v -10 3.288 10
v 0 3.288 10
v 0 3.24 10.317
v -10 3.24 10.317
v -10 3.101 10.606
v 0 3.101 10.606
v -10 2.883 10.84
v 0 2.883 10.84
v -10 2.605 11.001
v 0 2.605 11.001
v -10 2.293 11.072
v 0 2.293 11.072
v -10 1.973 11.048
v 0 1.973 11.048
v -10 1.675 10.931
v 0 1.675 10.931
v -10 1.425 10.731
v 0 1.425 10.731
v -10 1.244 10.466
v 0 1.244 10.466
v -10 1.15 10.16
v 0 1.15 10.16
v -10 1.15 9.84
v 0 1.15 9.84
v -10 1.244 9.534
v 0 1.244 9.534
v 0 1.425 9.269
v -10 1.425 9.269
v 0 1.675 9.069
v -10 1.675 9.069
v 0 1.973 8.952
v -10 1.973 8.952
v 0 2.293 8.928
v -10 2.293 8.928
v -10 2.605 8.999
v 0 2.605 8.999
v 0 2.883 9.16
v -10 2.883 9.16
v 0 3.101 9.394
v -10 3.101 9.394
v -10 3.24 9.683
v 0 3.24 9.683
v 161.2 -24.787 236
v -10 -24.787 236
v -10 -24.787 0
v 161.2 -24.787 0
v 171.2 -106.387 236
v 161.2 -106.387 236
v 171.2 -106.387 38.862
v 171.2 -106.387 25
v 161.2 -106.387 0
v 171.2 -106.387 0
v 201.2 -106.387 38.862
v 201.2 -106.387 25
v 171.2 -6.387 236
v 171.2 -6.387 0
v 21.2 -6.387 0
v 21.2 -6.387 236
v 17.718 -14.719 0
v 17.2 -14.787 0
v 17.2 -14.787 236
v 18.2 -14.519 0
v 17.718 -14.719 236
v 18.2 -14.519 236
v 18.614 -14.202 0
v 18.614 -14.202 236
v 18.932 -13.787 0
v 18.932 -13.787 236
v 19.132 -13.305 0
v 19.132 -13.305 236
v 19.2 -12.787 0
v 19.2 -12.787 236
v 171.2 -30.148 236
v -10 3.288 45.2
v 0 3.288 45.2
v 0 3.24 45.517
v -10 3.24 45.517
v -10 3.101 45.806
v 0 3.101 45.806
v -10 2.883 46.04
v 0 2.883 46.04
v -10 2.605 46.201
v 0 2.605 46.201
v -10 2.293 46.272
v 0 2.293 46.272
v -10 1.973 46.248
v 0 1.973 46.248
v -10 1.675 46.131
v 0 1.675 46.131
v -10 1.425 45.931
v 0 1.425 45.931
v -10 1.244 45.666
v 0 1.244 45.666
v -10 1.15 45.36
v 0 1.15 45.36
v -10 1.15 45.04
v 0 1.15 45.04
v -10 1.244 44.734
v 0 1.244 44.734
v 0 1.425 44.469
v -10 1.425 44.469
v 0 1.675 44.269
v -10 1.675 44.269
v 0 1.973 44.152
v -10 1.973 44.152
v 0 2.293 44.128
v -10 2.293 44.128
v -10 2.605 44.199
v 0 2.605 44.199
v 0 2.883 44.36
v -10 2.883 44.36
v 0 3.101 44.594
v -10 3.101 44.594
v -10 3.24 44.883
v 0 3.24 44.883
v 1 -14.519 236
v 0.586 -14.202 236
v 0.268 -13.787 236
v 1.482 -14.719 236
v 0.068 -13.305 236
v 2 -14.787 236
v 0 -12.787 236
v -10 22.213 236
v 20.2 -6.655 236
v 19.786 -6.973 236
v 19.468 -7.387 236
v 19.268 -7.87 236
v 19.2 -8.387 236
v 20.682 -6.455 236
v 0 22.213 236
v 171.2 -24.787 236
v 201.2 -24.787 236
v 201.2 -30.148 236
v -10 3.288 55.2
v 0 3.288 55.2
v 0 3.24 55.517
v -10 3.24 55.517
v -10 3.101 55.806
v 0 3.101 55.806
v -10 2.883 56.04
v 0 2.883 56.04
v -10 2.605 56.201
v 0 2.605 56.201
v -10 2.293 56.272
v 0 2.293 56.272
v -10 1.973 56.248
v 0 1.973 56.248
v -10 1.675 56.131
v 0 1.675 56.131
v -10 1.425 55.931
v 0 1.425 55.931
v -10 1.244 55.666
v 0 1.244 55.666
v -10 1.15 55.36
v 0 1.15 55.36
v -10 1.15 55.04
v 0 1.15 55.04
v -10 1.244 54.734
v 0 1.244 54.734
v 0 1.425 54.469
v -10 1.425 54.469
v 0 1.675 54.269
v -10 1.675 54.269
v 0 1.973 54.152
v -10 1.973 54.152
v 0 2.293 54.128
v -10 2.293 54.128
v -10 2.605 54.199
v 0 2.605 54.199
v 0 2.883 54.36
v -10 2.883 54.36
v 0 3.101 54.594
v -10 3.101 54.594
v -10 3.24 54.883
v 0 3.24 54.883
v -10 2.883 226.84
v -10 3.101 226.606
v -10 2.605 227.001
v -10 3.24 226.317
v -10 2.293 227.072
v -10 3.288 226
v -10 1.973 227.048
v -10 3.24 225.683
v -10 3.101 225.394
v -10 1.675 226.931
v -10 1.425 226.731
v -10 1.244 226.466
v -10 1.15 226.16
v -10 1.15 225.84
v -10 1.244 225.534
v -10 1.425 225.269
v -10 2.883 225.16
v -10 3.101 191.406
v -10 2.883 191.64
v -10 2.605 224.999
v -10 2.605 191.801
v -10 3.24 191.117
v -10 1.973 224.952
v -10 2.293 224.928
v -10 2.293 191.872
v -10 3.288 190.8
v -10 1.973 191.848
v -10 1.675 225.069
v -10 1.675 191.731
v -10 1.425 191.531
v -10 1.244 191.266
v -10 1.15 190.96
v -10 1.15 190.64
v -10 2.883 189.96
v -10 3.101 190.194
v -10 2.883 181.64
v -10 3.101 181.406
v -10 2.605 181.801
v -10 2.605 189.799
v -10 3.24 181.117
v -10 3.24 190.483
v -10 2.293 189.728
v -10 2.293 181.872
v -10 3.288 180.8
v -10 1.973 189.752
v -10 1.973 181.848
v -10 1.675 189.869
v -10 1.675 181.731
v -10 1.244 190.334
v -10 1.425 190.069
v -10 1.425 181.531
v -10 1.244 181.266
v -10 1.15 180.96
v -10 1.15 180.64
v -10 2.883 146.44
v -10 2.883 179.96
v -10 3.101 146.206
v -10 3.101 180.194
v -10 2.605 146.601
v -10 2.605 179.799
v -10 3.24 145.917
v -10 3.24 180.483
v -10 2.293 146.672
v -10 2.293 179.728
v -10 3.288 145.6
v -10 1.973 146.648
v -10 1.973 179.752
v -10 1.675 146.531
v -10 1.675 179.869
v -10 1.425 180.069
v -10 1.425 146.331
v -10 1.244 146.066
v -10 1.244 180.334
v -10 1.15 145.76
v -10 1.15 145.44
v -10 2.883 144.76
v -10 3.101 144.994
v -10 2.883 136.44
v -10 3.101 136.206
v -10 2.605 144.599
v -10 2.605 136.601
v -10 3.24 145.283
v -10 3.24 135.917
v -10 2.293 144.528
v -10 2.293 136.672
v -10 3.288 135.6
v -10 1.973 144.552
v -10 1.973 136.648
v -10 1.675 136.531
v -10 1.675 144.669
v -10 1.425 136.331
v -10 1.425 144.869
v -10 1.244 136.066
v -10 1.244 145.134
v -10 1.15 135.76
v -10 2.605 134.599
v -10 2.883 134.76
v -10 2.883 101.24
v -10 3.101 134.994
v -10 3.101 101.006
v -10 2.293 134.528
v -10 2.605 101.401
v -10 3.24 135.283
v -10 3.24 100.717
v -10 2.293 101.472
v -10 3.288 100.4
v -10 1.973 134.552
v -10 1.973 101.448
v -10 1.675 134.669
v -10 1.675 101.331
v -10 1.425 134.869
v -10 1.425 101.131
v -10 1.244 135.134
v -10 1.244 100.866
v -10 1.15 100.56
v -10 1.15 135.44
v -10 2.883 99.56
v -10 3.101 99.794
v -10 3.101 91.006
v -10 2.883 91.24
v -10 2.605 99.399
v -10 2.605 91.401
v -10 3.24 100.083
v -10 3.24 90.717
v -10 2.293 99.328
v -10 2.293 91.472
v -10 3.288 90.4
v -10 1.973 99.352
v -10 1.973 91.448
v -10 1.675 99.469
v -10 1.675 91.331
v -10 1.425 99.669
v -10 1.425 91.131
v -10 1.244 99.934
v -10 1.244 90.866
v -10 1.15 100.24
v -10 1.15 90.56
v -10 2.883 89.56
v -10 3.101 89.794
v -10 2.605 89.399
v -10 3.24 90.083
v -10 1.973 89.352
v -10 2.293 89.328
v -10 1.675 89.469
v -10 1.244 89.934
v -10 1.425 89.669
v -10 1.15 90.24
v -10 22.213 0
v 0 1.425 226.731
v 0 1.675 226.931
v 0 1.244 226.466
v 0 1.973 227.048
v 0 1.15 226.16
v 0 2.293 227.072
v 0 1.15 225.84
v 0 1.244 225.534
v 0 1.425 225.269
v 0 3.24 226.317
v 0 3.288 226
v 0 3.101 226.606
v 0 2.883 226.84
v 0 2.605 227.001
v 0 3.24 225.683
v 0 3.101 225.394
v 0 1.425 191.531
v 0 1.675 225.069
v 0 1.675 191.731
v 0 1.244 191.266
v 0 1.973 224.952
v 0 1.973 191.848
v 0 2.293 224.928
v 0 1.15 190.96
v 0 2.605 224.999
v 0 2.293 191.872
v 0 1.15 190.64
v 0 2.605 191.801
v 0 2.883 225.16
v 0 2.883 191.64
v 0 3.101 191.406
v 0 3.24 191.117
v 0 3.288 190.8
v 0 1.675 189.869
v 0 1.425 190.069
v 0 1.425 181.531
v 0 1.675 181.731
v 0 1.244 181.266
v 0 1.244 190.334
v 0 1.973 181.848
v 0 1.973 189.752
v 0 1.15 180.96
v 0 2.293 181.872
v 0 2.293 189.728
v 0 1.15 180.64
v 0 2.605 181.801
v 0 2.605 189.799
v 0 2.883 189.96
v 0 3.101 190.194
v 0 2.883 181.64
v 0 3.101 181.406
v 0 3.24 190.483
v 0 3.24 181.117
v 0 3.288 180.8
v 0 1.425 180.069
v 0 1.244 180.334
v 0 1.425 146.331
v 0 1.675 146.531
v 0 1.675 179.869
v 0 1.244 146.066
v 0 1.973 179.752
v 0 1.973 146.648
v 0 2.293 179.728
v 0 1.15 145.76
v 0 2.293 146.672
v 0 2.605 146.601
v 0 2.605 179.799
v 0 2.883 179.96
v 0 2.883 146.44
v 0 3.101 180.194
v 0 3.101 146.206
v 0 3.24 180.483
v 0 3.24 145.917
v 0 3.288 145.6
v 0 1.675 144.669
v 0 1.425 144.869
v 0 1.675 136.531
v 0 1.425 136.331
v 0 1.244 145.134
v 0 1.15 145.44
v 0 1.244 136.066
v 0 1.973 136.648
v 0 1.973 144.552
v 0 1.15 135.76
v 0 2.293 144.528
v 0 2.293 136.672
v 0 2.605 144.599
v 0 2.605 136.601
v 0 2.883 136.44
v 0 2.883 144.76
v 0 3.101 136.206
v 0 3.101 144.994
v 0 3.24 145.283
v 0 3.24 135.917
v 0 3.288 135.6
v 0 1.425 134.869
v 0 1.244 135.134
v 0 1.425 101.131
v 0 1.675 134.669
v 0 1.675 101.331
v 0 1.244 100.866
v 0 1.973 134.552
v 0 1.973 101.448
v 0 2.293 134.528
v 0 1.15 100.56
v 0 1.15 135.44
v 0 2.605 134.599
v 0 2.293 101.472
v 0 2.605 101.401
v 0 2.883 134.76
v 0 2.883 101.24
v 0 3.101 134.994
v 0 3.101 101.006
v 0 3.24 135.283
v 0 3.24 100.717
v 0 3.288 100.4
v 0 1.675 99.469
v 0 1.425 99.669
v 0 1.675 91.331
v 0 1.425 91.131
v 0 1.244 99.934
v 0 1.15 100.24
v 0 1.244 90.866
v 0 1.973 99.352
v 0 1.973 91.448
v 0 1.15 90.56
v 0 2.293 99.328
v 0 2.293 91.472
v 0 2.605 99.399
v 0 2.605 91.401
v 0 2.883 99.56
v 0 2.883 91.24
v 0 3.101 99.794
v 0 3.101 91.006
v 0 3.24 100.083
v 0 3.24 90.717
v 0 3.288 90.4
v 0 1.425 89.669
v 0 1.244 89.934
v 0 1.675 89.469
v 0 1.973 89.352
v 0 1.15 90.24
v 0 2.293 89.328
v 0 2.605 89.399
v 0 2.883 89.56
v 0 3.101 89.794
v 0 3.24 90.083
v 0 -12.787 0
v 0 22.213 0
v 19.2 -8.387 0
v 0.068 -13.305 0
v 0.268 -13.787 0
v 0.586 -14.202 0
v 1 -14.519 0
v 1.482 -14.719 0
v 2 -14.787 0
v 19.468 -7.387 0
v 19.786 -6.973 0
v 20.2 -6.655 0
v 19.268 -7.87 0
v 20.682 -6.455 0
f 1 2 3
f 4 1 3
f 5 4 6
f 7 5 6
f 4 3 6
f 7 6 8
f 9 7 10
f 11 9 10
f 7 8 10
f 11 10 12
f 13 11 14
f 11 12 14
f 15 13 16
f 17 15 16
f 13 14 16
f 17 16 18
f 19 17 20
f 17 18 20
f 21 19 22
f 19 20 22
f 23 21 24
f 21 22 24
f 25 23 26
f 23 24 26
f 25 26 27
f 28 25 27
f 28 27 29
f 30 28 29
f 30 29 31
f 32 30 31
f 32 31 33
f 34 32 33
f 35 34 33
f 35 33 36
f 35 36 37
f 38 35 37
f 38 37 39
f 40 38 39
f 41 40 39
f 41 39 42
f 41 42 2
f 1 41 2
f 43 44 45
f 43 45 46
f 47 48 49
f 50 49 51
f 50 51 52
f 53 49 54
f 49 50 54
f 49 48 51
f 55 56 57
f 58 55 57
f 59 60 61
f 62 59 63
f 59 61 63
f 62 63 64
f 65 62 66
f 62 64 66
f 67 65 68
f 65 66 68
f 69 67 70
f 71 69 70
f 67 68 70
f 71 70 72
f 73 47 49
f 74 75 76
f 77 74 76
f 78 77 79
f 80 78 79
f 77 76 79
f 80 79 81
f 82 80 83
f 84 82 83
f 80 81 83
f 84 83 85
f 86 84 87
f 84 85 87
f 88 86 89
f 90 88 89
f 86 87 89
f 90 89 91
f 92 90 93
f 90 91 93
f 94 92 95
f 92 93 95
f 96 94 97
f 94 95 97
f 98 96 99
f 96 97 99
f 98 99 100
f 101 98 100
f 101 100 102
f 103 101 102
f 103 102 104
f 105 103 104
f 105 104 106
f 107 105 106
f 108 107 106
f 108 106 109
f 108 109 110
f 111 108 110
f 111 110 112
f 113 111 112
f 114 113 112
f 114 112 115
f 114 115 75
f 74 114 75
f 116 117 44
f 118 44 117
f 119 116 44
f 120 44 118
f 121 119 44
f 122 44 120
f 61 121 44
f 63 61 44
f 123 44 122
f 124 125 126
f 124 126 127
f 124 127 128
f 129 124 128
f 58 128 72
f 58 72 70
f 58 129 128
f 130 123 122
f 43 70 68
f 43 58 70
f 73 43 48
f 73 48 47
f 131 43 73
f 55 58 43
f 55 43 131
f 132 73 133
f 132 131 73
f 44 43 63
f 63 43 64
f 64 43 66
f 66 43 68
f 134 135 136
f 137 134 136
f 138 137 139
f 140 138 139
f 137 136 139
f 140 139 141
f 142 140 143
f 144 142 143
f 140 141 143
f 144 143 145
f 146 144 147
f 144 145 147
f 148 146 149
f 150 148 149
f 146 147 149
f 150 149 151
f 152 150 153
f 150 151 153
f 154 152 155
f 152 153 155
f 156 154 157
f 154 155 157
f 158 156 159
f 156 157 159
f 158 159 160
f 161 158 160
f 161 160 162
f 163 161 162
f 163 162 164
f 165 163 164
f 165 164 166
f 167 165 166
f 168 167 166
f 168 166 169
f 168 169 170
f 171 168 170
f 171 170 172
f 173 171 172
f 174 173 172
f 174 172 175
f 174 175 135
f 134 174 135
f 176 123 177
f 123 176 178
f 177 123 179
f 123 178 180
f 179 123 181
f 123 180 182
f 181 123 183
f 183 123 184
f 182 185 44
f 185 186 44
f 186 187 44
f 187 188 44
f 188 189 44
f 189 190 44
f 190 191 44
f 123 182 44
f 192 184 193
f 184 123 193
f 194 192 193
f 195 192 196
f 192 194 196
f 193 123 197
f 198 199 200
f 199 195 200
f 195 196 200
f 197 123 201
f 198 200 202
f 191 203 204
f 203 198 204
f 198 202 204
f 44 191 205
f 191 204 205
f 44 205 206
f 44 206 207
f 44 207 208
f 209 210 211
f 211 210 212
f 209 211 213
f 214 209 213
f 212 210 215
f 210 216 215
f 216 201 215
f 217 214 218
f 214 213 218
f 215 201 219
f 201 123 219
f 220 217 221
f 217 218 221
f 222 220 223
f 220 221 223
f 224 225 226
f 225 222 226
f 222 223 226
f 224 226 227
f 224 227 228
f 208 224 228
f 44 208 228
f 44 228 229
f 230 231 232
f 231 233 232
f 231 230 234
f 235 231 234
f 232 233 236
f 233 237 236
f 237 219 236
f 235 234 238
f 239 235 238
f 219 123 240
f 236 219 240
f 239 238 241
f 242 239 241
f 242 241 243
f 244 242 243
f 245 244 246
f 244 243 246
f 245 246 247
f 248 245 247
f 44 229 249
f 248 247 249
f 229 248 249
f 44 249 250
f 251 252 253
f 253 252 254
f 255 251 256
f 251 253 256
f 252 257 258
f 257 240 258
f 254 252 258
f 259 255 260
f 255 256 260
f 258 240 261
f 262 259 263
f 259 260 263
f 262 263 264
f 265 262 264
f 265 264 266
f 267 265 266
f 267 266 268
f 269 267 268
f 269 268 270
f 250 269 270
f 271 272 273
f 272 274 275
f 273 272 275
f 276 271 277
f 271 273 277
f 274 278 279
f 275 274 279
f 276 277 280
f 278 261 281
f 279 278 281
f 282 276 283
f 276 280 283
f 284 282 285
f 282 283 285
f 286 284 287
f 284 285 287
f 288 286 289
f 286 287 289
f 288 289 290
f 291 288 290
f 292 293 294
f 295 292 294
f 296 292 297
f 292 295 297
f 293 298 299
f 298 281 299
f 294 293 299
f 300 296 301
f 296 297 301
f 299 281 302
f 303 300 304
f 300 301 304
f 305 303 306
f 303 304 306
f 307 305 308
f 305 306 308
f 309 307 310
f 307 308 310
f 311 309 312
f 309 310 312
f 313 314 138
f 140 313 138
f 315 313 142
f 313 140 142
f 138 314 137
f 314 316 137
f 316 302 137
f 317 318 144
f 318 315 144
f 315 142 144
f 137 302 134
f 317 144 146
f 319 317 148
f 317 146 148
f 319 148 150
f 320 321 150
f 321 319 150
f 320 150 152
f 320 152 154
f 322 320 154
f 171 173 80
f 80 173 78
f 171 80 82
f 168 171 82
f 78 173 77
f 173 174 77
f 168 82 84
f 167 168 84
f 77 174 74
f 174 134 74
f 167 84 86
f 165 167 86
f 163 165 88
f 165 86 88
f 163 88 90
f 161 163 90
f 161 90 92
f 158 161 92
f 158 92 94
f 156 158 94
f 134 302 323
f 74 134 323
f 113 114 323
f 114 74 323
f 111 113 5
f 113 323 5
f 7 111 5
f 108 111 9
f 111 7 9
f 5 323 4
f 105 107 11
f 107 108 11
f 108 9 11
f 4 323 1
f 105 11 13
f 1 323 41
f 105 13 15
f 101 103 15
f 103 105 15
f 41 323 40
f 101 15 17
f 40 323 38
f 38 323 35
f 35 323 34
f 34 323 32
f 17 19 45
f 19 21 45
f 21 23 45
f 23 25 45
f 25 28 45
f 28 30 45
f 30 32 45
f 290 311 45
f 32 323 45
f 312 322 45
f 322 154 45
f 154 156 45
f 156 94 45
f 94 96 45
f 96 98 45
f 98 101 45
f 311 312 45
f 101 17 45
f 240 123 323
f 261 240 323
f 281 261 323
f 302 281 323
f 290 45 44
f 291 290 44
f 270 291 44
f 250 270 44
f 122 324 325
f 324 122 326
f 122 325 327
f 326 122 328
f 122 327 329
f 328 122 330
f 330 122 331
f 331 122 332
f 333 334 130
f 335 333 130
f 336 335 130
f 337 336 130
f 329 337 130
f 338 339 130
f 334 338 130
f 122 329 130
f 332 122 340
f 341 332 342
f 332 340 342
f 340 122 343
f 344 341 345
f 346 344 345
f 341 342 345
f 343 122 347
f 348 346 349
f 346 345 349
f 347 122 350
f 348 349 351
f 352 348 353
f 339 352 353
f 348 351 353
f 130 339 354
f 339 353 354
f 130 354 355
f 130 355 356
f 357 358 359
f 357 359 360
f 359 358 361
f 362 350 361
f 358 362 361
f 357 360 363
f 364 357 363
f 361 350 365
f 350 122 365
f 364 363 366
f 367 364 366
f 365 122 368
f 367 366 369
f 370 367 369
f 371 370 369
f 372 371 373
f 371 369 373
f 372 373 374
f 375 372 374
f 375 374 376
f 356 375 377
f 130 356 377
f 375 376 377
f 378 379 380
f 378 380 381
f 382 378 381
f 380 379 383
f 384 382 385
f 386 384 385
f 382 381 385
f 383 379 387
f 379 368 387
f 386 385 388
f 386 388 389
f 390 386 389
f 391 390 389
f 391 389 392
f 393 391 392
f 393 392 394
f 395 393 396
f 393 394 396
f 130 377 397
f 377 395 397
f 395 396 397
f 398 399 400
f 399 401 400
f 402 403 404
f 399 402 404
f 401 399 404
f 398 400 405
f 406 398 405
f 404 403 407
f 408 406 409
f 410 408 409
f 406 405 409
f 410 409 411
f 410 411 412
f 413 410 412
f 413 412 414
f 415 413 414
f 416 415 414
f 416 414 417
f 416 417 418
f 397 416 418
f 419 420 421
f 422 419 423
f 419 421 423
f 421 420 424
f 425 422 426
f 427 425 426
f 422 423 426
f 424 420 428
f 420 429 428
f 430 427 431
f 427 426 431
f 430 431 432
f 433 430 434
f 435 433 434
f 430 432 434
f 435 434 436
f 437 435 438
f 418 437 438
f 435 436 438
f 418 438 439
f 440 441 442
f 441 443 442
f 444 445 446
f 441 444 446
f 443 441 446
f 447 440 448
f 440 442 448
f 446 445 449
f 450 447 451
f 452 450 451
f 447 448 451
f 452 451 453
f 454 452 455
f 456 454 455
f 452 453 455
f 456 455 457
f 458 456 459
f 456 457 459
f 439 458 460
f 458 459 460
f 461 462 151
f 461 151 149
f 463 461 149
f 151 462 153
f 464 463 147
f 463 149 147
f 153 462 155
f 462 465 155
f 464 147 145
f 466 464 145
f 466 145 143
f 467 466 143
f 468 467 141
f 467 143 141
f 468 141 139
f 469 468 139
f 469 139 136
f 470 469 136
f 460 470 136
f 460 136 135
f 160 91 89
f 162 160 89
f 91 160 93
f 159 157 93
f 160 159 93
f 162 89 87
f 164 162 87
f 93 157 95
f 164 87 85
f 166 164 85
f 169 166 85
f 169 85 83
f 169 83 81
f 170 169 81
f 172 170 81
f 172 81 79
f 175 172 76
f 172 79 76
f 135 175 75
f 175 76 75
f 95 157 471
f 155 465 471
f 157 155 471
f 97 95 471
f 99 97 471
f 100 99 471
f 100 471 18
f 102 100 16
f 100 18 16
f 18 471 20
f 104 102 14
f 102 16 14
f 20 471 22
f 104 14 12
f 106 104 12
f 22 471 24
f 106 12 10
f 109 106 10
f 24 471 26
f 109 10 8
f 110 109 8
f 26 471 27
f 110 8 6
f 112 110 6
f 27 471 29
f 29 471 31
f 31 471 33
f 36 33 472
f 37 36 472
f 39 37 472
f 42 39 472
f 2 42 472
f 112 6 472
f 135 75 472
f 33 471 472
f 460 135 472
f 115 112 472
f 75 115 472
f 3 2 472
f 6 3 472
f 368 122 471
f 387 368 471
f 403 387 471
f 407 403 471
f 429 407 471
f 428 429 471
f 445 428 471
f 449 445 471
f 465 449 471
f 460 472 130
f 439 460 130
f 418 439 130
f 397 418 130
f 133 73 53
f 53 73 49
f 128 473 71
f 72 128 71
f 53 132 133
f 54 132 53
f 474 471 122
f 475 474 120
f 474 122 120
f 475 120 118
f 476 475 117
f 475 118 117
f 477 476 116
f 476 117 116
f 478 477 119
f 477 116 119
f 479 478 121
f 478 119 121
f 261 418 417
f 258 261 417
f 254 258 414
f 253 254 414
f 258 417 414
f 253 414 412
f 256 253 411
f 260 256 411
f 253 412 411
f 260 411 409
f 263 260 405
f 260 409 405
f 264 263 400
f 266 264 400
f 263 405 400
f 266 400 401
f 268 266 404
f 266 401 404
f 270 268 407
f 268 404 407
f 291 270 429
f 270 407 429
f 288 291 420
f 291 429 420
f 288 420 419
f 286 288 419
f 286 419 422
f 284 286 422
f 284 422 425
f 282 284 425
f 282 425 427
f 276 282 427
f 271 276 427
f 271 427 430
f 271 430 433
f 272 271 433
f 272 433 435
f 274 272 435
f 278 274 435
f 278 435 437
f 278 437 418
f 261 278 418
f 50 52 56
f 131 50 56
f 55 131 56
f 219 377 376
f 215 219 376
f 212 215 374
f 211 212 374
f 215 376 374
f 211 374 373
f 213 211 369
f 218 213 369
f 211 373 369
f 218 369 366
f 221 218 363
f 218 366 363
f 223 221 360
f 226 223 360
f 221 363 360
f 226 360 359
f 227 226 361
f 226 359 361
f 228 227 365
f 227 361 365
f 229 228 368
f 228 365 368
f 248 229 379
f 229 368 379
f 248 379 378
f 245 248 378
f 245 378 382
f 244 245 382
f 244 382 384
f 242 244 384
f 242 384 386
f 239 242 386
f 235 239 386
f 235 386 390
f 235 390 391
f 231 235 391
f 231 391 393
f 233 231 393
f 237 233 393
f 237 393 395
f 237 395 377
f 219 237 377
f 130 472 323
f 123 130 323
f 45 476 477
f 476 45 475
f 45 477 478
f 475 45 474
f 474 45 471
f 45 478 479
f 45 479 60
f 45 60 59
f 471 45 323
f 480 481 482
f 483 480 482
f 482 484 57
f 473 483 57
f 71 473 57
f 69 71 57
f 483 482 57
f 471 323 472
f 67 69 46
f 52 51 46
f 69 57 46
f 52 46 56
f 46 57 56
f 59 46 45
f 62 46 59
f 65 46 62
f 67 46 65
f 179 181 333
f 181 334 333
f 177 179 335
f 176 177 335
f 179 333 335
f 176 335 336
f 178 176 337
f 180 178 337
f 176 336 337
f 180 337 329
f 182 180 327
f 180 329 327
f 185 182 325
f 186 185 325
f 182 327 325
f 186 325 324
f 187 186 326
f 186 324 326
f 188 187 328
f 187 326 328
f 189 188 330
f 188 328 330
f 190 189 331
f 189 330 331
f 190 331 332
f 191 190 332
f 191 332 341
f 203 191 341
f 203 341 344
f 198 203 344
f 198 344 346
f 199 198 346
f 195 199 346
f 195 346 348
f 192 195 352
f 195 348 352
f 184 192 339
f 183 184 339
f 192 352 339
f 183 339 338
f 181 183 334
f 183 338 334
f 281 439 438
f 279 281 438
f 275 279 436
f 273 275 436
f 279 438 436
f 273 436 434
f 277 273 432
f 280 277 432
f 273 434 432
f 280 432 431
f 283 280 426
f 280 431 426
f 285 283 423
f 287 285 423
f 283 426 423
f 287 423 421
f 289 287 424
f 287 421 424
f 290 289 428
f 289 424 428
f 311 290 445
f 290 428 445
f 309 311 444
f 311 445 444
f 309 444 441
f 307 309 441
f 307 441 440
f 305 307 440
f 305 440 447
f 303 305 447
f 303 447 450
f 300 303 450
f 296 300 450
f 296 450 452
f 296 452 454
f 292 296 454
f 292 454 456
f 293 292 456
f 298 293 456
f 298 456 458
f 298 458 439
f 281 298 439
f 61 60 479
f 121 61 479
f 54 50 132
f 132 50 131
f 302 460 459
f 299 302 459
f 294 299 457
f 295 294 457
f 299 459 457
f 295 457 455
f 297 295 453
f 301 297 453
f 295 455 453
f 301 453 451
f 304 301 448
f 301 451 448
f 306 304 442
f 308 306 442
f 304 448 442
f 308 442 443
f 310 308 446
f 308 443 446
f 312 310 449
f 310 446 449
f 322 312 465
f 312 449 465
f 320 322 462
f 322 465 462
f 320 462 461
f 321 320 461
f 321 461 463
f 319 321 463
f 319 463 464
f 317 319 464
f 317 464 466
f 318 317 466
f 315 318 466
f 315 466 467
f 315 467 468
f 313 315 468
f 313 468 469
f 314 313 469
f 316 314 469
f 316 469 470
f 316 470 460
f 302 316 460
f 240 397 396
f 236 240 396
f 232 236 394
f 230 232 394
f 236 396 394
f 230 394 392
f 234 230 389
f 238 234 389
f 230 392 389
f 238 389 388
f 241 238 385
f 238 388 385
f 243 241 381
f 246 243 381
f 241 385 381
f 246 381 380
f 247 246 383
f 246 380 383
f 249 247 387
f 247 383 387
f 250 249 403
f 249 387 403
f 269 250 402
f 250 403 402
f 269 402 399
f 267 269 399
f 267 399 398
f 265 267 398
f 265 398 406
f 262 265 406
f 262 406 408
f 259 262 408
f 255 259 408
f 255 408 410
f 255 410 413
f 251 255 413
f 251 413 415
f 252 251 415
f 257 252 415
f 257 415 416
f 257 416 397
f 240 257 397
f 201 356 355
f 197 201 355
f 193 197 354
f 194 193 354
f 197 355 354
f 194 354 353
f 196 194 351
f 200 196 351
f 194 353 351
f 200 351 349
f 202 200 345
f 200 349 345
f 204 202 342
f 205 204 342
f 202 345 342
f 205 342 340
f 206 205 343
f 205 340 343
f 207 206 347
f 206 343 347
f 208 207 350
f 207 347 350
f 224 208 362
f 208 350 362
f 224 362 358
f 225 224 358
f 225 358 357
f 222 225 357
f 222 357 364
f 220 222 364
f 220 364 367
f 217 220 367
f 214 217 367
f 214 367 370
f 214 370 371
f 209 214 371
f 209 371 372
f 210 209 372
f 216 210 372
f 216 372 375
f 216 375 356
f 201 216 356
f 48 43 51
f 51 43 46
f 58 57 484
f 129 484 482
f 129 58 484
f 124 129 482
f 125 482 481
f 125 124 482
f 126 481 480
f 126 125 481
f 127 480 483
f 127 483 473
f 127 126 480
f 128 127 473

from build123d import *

# Parameters (mm, degrees)
BOSS_EXTRUDE1_DEPTH = 236
SKETCH5_R           = 1.075
CUT_EXTRUDE1_DEPTH  = 85
FILLET1_R           = 2
SKETCH7_W           = 10
SKETCH7_H           = 236
BOSS_EXTRUDE2_DEPTH = 100
BOSS_EXTRUDE3_DEPTH = 30


with BuildPart() as part:
    # Sketch2 → Boss-Extrude1 (new body)
    with BuildSketch(Plane.XY):
        Polygon((0, 0), (0, 22.212686922), (-10, 22.212686922), (-10, -24.787313078), (171.2, -24.787313078), (171.2, -6.387313078), (19.2, -6.387313078), (19.2, -14.787313078), (0, -14.787313078), align=None)
    extrude(amount=BOSS_EXTRUDE1_DEPTH)

    # Sketch5 → Cut-Extrude1 (cut, symmetric)
    with BuildSketch(Plane(origin=(0, 0, 0), x_dir=(0, 0, -1), z_dir=(1, 0, 0))):
        with Locations(Location((-10, 2.212686922, 0), (0, 0, 90))):
            Circle(SKETCH5_R)
        with Locations(Location((-45.2, 2.212686922, 0), (0, 0, 90))):
            Circle(SKETCH5_R)
        with Locations(Location((-55.2, 2.212686922, 0), (0, 0, 90))):
            Circle(SKETCH5_R)
        with Locations(Location((-90.4, 2.212686922, 0), (0, 0, 90))):
            Circle(SKETCH5_R)
        with Locations(Location((-100.4, 2.212686922, 0), (0, 0, 90))):
            Circle(SKETCH5_R)
        with Locations(Location((-135.6, 2.212686922, 0), (0, 0, 90))):
            Circle(SKETCH5_R)
        with Locations(Location((-145.6, 2.212686922, 0), (0, 0, 90))):
            Circle(SKETCH5_R)
        with Locations(Location((-180.8, 2.212686922, 0), (0, 0, 90))):
            Circle(SKETCH5_R)
        with Locations(Location((-190.8, 2.212686922, 0), (0, 0, 90))):
            Circle(SKETCH5_R)
        with Locations(Location((-226, 2.212686922, 0), (0, 0, 90))):
            Circle(SKETCH5_R)
    extrude(amount=CUT_EXTRUDE1_DEPTH, both=True, mode=Mode.SUBTRACT)

    # Fillet1
    fillet1_edges = [part.edges().sort_by_distance(p)[0] for p in [
        (0, -14.787313078, 118),
        (19.2, -14.787313078, 118),
        (19.2, -6.387313078, 118),
    ]]
    fillet(fillet1_edges, radius=FILLET1_R)

    # Sketch7 → Boss-Extrude2 (add)
    with BuildSketch(Plane(origin=(0, -6.387313078, 0), x_dir=(1, 0, 0), z_dir=(0, 1, 0))):
        with Locations((166.2, -118)):
            Rectangle(SKETCH7_W, SKETCH7_H)
    extrude(amount=-BOSS_EXTRUDE2_DEPTH)

    # Sketch8 → Boss-Extrude3 (add)
    with BuildSketch(Plane(origin=(171.2, 0, 0), x_dir=(0, 0, -1), z_dir=(1, 0, 0))):
        Polygon((-236, -24.787313078), (-236, -30.148189832), (-38.862071019, -106.387313078), (-25, -106.387313078), align=None)
    extrude(amount=BOSS_EXTRUDE3_DEPTH)


solid = part.part
